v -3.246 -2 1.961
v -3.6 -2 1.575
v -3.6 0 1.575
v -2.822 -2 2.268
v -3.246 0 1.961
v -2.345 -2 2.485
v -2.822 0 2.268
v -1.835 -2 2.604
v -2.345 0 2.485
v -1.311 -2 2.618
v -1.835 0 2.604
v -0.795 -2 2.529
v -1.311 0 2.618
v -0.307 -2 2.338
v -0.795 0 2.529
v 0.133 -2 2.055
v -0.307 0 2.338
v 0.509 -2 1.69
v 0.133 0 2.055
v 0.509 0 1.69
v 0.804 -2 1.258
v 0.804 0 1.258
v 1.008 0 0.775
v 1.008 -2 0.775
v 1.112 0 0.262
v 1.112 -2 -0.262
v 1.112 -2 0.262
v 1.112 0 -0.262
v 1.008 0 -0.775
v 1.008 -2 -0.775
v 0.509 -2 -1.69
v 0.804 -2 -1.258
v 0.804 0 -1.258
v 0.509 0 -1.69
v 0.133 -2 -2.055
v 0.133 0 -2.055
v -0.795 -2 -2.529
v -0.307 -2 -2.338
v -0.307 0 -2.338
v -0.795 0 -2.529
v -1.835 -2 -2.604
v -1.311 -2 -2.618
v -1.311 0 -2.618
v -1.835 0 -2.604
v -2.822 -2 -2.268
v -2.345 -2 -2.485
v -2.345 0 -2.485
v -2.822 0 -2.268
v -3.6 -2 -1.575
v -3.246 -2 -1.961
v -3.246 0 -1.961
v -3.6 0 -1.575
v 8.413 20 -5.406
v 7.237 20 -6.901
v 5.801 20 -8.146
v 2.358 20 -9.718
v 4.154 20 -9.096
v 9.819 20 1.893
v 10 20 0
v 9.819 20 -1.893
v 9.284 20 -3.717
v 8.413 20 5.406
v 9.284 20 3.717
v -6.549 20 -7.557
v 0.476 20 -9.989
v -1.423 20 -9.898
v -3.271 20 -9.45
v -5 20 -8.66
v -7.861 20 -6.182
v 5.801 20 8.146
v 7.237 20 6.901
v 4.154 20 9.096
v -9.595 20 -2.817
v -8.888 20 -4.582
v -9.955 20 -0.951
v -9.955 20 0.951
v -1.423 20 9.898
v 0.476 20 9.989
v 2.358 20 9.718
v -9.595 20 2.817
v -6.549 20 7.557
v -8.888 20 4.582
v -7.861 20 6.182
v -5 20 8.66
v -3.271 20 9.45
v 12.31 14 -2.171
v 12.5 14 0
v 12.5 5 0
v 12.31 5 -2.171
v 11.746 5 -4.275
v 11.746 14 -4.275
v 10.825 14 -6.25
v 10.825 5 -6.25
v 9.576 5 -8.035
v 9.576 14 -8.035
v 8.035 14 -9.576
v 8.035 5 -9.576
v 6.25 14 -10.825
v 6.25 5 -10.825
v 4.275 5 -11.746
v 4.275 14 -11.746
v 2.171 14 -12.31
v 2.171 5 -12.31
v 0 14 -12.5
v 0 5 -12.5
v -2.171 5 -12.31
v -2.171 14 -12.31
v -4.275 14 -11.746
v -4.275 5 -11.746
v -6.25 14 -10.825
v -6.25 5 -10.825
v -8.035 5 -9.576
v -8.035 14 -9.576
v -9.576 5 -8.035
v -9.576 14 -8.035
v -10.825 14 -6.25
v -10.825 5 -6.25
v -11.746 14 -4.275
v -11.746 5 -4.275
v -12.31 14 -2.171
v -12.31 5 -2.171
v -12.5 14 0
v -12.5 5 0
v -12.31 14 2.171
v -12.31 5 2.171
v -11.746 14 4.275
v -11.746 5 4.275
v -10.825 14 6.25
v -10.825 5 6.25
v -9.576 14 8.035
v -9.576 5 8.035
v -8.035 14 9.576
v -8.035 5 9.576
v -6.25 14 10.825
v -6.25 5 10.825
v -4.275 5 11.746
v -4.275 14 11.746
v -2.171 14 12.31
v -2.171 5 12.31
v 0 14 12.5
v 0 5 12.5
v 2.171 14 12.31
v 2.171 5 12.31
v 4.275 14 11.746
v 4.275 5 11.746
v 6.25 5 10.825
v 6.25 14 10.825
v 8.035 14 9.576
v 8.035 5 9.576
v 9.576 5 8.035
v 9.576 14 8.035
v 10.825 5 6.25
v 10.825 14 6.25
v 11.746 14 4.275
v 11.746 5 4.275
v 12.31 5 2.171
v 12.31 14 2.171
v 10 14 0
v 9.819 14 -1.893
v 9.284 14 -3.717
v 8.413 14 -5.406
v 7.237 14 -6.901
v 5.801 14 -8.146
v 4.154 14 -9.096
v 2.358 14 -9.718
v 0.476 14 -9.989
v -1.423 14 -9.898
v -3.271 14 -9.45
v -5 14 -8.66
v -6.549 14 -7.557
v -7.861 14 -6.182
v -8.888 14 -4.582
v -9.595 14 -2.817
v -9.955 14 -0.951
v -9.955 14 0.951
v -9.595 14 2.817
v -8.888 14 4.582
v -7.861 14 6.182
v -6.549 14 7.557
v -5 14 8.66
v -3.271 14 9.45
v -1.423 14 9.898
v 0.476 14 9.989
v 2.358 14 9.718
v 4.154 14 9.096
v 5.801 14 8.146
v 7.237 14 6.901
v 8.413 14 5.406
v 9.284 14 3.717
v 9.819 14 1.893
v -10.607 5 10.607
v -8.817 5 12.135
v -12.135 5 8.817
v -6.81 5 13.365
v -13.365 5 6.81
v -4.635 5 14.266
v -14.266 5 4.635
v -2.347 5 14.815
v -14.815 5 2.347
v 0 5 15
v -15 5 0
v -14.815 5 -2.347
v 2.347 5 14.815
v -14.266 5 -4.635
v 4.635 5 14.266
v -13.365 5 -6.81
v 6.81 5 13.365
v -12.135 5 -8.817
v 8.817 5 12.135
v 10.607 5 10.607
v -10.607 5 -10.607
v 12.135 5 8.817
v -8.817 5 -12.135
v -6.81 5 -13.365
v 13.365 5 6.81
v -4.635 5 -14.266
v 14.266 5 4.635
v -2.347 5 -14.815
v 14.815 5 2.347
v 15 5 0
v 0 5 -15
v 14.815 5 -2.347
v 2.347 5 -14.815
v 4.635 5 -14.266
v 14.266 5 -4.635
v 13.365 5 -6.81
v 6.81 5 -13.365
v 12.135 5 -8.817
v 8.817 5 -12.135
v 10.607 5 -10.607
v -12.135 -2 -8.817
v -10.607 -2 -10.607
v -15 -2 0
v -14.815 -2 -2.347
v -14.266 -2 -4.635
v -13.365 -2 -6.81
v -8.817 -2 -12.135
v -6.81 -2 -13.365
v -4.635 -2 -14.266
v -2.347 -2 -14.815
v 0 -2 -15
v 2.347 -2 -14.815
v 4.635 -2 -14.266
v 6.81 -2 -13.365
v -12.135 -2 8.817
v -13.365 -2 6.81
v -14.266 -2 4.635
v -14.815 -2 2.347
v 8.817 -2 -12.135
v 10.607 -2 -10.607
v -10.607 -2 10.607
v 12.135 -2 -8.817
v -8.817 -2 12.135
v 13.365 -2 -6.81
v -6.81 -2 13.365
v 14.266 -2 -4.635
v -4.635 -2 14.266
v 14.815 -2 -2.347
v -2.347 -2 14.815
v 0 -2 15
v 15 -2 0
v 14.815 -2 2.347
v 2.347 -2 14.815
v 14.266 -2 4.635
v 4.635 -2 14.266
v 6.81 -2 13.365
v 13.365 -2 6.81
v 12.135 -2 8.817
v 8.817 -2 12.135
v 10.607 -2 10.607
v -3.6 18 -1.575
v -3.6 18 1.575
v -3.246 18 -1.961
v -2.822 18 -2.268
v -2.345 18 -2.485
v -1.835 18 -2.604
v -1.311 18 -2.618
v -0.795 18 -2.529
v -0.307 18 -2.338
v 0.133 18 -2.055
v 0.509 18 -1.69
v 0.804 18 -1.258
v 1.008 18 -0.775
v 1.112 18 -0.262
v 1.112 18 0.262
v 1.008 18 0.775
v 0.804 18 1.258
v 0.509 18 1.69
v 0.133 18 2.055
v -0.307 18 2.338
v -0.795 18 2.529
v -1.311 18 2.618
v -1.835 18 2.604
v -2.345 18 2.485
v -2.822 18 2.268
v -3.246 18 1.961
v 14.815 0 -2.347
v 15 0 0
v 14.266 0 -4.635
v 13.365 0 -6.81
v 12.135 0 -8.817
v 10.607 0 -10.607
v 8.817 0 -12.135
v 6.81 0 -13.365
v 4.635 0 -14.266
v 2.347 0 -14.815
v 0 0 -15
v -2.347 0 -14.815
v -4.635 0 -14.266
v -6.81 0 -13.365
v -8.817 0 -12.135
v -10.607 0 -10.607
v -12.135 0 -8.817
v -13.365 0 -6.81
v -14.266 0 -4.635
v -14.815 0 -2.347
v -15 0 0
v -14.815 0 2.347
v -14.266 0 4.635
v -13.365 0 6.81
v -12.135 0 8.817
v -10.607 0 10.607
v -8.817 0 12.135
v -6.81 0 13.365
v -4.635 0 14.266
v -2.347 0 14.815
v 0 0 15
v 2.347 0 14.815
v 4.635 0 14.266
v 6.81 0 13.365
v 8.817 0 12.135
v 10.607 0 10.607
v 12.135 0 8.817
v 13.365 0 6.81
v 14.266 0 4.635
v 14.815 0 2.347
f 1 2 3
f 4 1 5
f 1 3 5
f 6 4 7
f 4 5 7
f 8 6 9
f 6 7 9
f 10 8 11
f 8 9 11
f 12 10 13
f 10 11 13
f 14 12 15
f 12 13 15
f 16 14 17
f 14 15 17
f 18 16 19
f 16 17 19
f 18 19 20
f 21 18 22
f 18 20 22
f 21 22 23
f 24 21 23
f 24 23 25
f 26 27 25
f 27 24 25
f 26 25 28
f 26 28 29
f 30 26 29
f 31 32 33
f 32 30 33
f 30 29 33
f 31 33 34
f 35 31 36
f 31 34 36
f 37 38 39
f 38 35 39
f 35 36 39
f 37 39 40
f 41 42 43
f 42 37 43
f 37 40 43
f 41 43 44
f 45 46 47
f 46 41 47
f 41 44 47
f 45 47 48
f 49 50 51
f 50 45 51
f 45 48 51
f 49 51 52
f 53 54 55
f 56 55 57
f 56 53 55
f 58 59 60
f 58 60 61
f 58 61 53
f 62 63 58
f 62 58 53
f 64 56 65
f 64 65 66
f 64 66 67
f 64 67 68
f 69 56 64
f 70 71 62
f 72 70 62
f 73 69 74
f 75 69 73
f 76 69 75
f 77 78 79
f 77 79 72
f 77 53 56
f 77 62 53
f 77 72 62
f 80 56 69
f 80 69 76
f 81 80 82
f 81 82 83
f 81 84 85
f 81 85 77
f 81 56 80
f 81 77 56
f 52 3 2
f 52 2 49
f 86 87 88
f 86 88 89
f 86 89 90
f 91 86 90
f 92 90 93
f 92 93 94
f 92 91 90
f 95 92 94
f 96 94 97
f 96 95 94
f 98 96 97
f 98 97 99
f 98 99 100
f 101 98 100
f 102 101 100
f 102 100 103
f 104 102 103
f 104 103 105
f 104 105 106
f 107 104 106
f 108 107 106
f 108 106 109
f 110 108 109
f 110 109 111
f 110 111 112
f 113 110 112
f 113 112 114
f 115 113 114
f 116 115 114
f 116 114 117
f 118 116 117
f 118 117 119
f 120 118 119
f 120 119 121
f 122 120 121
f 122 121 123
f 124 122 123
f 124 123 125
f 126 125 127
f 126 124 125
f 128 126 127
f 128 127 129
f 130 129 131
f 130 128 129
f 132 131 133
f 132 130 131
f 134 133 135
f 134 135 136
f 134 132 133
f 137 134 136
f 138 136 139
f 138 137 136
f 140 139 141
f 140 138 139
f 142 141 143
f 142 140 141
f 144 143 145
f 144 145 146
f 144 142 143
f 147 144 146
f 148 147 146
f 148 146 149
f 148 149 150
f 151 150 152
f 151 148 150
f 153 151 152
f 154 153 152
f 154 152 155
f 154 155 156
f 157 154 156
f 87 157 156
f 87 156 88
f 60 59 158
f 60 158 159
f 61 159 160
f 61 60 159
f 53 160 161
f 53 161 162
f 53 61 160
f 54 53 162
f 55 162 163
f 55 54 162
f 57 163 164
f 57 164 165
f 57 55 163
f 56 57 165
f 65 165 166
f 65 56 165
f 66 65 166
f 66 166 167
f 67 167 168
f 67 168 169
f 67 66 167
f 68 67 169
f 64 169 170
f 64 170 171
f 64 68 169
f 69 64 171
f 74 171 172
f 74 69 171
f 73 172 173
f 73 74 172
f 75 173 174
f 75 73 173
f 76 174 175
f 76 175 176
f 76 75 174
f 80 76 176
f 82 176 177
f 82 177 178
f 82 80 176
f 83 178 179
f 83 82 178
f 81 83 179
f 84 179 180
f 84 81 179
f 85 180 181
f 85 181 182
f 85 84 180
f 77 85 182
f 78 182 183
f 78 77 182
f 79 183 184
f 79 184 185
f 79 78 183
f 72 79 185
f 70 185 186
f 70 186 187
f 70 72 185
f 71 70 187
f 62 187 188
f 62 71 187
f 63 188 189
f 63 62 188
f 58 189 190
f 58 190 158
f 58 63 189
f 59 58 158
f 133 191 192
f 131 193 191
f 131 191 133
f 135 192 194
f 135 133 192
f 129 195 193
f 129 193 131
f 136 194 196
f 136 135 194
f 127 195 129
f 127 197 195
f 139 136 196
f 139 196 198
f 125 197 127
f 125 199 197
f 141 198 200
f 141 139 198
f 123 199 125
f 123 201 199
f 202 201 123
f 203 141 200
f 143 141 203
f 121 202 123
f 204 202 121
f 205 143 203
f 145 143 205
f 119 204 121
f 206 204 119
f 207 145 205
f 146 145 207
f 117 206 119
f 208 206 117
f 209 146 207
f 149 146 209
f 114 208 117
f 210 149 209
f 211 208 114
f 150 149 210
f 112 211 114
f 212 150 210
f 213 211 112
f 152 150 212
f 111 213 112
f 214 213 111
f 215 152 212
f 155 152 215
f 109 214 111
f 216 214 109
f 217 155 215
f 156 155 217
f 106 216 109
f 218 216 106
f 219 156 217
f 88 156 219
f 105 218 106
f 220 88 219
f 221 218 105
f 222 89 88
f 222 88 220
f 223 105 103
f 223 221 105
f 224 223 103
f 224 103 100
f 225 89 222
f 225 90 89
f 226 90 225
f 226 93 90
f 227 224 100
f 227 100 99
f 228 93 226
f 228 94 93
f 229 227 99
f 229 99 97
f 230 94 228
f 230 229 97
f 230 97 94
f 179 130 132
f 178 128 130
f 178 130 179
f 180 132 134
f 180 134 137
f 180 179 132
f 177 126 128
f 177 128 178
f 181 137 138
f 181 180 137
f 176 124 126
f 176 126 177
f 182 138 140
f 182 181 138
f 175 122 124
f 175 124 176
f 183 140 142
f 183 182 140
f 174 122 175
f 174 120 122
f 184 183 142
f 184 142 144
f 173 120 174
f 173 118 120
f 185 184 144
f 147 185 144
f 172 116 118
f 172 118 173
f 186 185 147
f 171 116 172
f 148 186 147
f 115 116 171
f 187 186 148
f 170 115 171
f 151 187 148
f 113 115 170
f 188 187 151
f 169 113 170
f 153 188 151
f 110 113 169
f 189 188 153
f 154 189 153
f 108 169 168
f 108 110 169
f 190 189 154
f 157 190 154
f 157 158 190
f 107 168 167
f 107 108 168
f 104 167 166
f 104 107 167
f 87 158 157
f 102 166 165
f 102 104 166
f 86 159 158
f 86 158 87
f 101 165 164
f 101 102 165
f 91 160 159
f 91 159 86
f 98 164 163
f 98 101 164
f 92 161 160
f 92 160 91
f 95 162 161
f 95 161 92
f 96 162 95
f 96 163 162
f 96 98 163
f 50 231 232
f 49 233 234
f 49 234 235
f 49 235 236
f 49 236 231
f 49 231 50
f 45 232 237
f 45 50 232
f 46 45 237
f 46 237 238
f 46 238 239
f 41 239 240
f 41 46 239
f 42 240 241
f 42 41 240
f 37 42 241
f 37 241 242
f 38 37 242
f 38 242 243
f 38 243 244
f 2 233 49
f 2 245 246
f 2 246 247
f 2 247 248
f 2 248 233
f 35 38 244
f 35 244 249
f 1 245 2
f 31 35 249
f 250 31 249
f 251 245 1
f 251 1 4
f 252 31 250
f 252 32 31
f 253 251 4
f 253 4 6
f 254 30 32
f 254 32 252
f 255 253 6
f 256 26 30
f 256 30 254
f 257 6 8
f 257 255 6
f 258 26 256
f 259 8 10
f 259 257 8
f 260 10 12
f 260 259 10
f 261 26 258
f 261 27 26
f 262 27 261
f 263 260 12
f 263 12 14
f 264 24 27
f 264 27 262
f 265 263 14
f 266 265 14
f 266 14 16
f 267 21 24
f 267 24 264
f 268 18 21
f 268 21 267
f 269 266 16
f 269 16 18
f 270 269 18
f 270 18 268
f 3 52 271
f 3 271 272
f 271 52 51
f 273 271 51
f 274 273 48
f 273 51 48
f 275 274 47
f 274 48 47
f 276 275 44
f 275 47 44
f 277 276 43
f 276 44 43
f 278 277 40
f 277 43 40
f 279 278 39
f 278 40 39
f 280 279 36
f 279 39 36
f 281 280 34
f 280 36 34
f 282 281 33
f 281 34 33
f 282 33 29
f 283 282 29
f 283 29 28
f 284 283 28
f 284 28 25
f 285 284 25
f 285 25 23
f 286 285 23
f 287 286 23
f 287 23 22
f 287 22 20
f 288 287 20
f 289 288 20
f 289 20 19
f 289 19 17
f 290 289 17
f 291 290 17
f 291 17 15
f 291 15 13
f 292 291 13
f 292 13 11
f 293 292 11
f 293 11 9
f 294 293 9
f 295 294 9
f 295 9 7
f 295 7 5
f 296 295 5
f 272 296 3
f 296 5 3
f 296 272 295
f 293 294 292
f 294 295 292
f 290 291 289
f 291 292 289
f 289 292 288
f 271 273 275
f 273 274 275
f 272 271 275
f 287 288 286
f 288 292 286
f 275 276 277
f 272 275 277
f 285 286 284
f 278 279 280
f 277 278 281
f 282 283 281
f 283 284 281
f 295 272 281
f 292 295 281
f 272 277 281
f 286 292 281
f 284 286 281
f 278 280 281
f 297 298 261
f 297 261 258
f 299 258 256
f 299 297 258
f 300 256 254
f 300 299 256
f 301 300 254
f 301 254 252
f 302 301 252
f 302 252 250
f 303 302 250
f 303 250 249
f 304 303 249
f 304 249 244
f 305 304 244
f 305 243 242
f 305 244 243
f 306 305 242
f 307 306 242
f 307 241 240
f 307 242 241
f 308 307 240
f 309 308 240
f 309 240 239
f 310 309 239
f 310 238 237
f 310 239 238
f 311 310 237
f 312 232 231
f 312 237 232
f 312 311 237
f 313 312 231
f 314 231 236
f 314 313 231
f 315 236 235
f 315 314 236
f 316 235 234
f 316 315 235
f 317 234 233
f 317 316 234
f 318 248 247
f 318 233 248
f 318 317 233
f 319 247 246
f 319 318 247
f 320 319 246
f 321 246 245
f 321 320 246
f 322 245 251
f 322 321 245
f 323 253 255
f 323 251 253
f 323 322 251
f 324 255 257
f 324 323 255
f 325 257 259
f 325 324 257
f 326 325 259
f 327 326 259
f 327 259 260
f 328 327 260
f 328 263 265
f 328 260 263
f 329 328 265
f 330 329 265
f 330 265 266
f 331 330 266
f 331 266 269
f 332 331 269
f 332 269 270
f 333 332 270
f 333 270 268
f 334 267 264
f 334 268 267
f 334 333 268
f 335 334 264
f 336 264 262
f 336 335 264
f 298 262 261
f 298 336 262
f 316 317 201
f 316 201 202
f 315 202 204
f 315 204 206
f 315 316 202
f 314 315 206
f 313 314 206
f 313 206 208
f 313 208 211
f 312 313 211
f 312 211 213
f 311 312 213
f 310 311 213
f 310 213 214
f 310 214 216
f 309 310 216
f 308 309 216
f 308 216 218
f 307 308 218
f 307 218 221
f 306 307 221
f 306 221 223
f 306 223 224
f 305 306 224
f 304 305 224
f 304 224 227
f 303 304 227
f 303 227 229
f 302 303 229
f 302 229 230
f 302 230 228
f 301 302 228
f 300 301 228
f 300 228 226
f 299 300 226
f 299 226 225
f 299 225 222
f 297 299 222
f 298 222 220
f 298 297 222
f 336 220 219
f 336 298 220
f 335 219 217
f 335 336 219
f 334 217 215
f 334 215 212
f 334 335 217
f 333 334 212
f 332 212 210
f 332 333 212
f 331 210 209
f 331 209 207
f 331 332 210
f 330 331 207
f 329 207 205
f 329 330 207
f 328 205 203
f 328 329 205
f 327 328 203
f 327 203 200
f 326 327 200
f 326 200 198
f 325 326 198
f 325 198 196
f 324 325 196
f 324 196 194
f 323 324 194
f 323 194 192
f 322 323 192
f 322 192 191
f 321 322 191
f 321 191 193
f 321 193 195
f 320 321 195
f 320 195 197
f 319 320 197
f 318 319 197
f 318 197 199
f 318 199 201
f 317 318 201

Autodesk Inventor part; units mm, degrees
ref_plane "YZ Plane" through (0, 0, 0) normal (1, 0, 0) x (0, 1, 0)
ref_plane "XZ Plane" through (0, 0, 0) normal (0, 1, 0) x (-1, 0, 0)
ref_plane "XY Plane" through (0, 0, 0) normal (0, 0, 1) x (1, 0, 0)
sketch "Szkic1" plane through (0, 0, 0) normal (0, 1, 0) x (-1, 0, 0)
  circle A0 centre (0, 0) radius 15
  arc A1 (3.6, 1.575) -> (3.6, -1.575) centre (1.5, 0) ccw
  line L0 (3.6, -1.575) -> (3.6, 1.575)
  dimension "d0" = 30
  dimension "d1" = 5.25
  dimension "d2" = 3.6
extrude "Wyciągnięcie proste1" add sketch "Szkic1" along normal blind 20
sketch "Szkic2" plane through (0, 20, 0) normal (0, 1, 0) x (1, 0, 0)
  circle A0 centre (0, 0) radius 15 projected
  circle A1 centre (0, 0) radius 12.5
extrude "Wyciągnięcie proste2" add sketch "Szkic2" against normal blind 2 contours A0 | A1
sketch "Szkic3" plane through (0, 20, 0) normal (0, 1, 0) x (1, 0, 0)
  circle A0 centre (0, 0) radius 15
  circle A1 centre (0, 0) radius 12.5
  dimension "d7" = 25
extrude "Wyciągnięcie proste3" cut sketch "Szkic3" against normal blind 15
sketch "Szkic4" plane through (0, 20, 0) normal (0, 1, 0) x (1, 0, 0)
  circle A0 centre (0, 0) radius 10
  circle A1 centre (0, 0) radius 12.5
  dimension "d10" = 20
extrude "Wyciągnięcie proste4" cut sketch "Szkic4" against normal blind 6
sketch "Szkic5" plane through (0, 18, 0) normal (0, -1, 0) x (1, 0, 0)
  point P0 (0, 0)
sketch "Szkic6" plane through (0, 0, 0) normal (0, -1, 0) x (1, 0, 0)
  circle A0 centre (0, 0) radius 15
  line L0 (-3.6, 1.575) -> (-3.6, -1.575) projected
  line L1 (-3.6, 1.575) -> (-3.6, -1.575)
  arc A1 (-3.6, -1.575) -> (-3.6, 1.575) centre (-1.5, 0) ccw
extrude "Wyciągnięcie proste5" add sketch "Szkic6" along normal blind 2
properties part number "_Drukowanie 3D"
